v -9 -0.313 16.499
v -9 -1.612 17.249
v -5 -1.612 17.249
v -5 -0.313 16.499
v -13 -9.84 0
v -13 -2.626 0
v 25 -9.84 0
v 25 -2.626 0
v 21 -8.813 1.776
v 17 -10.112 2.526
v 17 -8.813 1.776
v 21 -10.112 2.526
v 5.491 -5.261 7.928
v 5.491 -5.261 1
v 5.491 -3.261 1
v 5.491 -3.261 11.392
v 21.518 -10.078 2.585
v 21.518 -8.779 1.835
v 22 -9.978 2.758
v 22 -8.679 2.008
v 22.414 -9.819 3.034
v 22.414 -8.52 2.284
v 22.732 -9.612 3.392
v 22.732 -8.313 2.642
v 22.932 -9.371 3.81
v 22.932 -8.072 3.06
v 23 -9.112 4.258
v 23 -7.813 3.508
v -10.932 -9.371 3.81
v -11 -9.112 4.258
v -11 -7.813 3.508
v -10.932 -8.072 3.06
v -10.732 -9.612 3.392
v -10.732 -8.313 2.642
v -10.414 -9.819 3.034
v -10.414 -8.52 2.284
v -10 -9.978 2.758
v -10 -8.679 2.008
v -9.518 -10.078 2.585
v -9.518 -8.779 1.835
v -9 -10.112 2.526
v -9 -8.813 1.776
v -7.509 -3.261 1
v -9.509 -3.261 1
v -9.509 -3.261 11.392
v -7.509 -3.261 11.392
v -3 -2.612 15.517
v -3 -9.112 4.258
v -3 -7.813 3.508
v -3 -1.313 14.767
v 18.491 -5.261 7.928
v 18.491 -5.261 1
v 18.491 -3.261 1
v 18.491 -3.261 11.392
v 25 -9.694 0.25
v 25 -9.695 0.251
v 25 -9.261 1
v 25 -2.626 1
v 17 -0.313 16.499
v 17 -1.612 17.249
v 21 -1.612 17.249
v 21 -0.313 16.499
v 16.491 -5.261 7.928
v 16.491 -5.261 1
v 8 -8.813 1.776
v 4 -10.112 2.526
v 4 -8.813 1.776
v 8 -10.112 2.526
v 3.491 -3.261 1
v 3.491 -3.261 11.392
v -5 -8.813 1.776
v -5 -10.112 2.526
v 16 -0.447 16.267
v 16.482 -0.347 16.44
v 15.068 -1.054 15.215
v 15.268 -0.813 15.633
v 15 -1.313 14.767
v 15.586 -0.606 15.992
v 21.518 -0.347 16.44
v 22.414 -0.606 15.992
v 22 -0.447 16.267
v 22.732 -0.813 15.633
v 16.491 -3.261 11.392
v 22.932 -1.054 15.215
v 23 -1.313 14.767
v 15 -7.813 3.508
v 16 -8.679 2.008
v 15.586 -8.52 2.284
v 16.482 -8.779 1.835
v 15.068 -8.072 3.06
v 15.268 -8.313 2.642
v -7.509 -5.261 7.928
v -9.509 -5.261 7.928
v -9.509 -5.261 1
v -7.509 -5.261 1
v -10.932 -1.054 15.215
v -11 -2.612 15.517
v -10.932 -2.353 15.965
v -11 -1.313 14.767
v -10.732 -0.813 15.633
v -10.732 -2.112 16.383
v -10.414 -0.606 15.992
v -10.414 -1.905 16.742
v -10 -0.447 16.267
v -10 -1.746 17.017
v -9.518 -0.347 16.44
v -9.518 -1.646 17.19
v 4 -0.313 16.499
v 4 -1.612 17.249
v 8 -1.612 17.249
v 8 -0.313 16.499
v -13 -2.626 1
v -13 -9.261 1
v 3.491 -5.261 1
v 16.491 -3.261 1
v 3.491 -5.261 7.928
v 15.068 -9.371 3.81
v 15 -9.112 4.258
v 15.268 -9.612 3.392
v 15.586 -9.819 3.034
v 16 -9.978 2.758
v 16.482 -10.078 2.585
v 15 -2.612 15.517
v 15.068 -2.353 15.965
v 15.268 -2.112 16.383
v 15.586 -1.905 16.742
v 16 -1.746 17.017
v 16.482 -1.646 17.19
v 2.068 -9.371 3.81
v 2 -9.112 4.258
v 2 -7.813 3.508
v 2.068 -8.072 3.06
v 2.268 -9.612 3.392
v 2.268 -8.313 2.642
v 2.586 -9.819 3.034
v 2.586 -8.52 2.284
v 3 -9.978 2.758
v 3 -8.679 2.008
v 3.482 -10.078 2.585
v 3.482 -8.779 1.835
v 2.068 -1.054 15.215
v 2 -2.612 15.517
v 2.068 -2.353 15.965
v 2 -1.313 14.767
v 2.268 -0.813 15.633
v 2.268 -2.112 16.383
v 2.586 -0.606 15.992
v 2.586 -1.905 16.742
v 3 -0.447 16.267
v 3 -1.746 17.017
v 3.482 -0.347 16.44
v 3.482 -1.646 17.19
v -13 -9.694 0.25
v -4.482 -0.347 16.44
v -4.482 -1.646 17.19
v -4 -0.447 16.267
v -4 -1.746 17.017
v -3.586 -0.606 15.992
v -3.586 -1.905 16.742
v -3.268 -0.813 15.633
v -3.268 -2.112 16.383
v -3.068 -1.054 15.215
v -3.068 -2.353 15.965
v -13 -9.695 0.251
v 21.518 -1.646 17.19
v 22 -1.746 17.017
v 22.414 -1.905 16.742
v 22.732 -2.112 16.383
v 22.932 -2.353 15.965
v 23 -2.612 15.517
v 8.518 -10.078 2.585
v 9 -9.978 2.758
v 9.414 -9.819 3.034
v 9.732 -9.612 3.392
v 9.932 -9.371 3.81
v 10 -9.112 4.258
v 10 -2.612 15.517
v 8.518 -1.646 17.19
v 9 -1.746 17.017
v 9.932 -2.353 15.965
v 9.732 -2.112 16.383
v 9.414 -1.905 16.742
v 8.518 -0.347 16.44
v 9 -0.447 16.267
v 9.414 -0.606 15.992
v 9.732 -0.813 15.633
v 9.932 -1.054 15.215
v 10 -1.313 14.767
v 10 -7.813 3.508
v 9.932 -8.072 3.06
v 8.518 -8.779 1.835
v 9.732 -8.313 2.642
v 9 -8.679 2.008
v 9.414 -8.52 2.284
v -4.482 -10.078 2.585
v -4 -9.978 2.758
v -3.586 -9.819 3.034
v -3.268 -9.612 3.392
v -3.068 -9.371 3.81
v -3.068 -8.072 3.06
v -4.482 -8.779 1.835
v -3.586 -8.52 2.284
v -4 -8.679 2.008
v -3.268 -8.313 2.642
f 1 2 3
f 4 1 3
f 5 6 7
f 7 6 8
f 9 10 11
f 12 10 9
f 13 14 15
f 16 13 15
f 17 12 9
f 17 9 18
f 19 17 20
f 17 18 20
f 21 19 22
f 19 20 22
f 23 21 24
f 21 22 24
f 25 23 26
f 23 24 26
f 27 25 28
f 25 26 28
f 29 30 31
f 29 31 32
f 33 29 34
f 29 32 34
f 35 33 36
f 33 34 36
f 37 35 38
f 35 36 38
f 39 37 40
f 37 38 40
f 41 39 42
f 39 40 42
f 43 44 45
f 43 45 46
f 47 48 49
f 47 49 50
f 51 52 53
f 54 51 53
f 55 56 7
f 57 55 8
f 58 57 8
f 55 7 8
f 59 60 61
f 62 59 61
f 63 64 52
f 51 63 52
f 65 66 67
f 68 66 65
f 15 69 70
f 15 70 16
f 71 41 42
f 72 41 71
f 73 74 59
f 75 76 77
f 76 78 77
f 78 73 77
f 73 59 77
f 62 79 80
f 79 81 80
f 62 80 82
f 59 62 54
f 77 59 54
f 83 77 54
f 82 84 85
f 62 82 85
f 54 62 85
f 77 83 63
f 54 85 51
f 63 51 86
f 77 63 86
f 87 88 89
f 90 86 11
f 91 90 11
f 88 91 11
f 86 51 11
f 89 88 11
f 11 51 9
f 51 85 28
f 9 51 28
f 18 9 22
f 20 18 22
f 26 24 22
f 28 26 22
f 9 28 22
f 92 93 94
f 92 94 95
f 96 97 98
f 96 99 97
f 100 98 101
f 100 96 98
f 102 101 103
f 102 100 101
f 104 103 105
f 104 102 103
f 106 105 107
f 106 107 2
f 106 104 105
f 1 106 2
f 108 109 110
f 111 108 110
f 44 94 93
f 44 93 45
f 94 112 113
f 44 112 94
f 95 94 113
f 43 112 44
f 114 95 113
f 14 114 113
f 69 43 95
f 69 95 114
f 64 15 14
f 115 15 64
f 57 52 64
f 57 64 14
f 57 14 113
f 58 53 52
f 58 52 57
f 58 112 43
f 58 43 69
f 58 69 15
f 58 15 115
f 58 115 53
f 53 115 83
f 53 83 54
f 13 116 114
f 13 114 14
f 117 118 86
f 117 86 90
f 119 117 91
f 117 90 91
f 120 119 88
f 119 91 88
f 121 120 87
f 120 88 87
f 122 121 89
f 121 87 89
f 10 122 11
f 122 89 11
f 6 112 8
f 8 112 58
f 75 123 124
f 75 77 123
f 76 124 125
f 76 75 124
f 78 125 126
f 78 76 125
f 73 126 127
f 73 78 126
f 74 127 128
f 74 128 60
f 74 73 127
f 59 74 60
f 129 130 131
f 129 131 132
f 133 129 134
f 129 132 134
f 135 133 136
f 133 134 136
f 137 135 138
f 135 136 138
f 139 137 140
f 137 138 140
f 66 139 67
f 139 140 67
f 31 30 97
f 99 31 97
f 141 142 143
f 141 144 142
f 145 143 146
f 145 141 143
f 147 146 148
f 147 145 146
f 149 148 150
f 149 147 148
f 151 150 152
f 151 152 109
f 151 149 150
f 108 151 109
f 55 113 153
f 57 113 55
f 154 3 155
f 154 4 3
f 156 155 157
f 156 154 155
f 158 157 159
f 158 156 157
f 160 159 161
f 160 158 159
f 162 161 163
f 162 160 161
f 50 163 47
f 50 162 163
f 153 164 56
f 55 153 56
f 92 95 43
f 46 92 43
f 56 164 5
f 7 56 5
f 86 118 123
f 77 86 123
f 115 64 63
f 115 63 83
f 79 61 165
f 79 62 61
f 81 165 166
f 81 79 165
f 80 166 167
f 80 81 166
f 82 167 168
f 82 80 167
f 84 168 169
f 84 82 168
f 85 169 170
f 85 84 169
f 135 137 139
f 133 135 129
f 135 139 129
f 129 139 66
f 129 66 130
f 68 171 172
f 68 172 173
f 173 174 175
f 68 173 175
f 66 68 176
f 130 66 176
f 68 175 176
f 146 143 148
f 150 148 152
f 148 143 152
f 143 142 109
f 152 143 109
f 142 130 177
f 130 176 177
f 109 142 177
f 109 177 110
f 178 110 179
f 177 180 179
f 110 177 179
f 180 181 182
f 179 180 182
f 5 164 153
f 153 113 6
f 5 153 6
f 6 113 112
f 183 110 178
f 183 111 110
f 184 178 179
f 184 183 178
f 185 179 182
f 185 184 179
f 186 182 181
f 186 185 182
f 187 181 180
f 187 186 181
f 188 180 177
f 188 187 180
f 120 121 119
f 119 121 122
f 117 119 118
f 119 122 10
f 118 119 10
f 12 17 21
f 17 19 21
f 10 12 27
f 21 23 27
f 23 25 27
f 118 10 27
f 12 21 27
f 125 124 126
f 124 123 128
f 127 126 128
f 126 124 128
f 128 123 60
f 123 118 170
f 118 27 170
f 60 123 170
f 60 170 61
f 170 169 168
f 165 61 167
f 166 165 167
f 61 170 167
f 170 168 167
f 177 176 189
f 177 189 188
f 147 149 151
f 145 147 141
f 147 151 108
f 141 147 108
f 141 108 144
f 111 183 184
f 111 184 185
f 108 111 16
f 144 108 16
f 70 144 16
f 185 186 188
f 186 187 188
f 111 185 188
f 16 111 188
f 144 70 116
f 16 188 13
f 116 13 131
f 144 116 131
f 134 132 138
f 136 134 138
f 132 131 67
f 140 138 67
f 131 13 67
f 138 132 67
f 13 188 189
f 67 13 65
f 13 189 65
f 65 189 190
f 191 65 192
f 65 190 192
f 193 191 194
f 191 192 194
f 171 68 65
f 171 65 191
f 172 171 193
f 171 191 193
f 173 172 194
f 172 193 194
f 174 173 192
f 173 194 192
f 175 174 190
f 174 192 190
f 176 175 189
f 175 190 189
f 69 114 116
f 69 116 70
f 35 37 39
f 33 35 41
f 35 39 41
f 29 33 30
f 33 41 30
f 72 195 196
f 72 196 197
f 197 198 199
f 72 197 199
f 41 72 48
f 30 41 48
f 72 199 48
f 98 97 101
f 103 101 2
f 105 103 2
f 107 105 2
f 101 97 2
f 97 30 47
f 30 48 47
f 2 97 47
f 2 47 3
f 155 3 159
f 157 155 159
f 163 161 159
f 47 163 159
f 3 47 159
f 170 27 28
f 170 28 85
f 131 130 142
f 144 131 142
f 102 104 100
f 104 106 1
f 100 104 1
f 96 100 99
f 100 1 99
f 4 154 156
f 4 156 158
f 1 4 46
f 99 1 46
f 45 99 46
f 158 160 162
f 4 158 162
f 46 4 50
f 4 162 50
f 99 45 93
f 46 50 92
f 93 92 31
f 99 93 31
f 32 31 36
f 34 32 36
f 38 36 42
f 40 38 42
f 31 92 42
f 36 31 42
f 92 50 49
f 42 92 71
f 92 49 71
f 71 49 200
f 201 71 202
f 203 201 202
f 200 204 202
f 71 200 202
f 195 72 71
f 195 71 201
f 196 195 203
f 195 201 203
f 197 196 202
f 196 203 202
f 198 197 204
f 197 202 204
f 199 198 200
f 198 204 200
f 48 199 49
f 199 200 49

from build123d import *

# Parameters (mm, degrees)
SKETCH1_W           = 50
SKETCH1_H           = 30
BOSS_EXTRUDE1_DEPTH = 1
BOSS_EXTRUDE2_DEPTH = 50
SKETCH3_W           = 50
SKETCH3_H           = 20.262529014
SKETCH3_W_2         = 8
SKETCH3_H_2         = 17
CUT_EXTRUDE1_DEPTH  = 1.5
BOSS_EXTRUDE3_REACH = 18.249
SKETCH4_W           = 2
SKETCH4_H           = 2
CUT_EXTRUDE2_DEPTH  = 50
SKETCH6_W           = 12
SKETCH6_H           = 25.737309448
CUT_EXTRUDE3_DEPTH  = 1
SKETCH7_W           = 38
SKETCH7_H           = 17.625558307
CUT_EXTRUDE4_DEPTH  = 1
FILLET1_R           = 2
FILLET2_R           = 2


with BuildPart() as part:
    # Sketch1 → Boss-Extrude1 (new body)
    with BuildSketch(Plane.XY):
        Rectangle(SKETCH1_W, SKETCH1_H)
    extrude(amount=BOSS_EXTRUDE1_DEPTH)

    # Sketch2 → Boss-Extrude2 (add, through all)
    with BuildSketch(Plane(origin=(25, 0, 0), x_dir=(0, 0, -1), z_dir=(1, 0, 0))):
        Polygon((-1, -10.993105909), (-18.547864871, -0.861841403), (-17.797864871, 0.437196703), (-1, -9.261055102), align=None)
    extrude(amount=-BOSS_EXTRUDE2_DEPTH)

    # Sketch3 → Cut-Extrude1 (cut)
    with BuildSketch(Plane(origin=(0, -8.677842134, 5.010154492), x_dir=(1, 0, 0), z_dir=(0, -0.866025404, 0.5))):
        with Locations((0, 5.500736956)):
            Rectangle(SKETCH3_W, SKETCH3_H)
        with Locations((19, 5.632001463)):
            Rectangle(SKETCH3_W_2, SKETCH3_H_2, mode=Mode.SUBTRACT)
        with Locations((6, 5.632001463)):
            Rectangle(SKETCH3_W_2, SKETCH3_H_2, mode=Mode.SUBTRACT)
        with Locations((-7, 5.632001463)):
            Rectangle(SKETCH3_W_2, SKETCH3_H_2, mode=Mode.SUBTRACT)
    extrude(amount=-CUT_EXTRUDE1_DEPTH, mode=Mode.SUBTRACT)

    # Boss-Extrude3: up to this face of the body (flat: up to its plane)
    boss_extrude3_end = Plane(part.part.faces().sort_by_distance((19, -5.861841403, 9.887610833))[0])
    # Sketch4 → Boss-Extrude3 (add, up to the picked face)
    with BuildSketch(Plane.XY.offset(1), mode=Mode.PRIVATE) as boss_extrude3_sk1:
        with Locations((17.490902079, -4.261055102)):
            Rectangle(SKETCH4_W, SKETCH4_H)
    boss_extrude3_tool1 = split(extrude(boss_extrude3_sk1.sketch, amount=BOSS_EXTRUDE3_REACH, mode=Mode.PRIVATE), bisect_by=boss_extrude3_end, keep=Keep.BOTH, mode=Mode.PRIVATE)
    add(boss_extrude3_tool1.solids().sort_by_distance((17.490902, -4.261055, 1))[0])
    # Sketch4 → Boss-Extrude3 (add, up to the picked face)
    with BuildSketch(Plane.XY.offset(1), mode=Mode.PRIVATE) as boss_extrude3_sk2:
        with Locations((4.490902079, -4.261055102)):
            Rectangle(SKETCH4_W, SKETCH4_H)
    boss_extrude3_tool2 = split(extrude(boss_extrude3_sk2.sketch, amount=BOSS_EXTRUDE3_REACH, mode=Mode.PRIVATE), bisect_by=boss_extrude3_end, keep=Keep.BOTH, mode=Mode.PRIVATE)
    add(boss_extrude3_tool2.solids().sort_by_distance((4.490902, -4.261055, 1))[0])
    # Sketch4 → Boss-Extrude3 (add, up to the picked face)
    with BuildSketch(Plane.XY.offset(1), mode=Mode.PRIVATE) as boss_extrude3_sk3:
        with Locations((-8.509097921, -4.261055102)):
            Rectangle(SKETCH4_W, SKETCH4_H)
    boss_extrude3_tool3 = split(extrude(boss_extrude3_sk3.sketch, amount=BOSS_EXTRUDE3_REACH, mode=Mode.PRIVATE), bisect_by=boss_extrude3_end, keep=Keep.BOTH, mode=Mode.PRIVATE)
    add(boss_extrude3_tool3.solids().sort_by_distance((-8.509098, -4.261055, 1))[0])

    # Sketch5 → Cut-Extrude2 (cut)
    with BuildSketch(Plane.ZY.offset(25)):
        Polygon((0.250581886, -9.69507566), (0, -9.840198507), (0, -15), (1, -15), (1, -10.993105909), align=None)
    extrude(amount=-CUT_EXTRUDE2_DEPTH, mode=Mode.SUBTRACT)

    # Sketch6 → Cut-Extrude3 (cut)
    with BuildSketch(Plane.XY.offset(1)):
        with Locations((-19, 2.131345276)):
            Rectangle(SKETCH6_W, SKETCH6_H)
    extrude(amount=-CUT_EXTRUDE3_DEPTH, mode=Mode.SUBTRACT)

    # Sketch7 → Cut-Extrude4 (cut)
    with BuildSketch(Plane.XY.offset(1)):
        with Locations((6, 6.187220847)):
            Rectangle(SKETCH7_W, SKETCH7_H)
    extrude(amount=-CUT_EXTRUDE4_DEPTH, mode=Mode.SUBTRACT)

    # Fillet1
    fillet1_edges = [part.edges().sort_by_distance(p)[0] for p in [
        (-3, -9.46232235, 2.151394901),
        (-3, -0.96232235, 16.873826765),
        (-11, -0.96232235, 16.873826765),
        (-11, -9.46232235, 2.151394901),
    ]]
    fillet(fillet1_edges, radius=FILLET1_R)

    # Fillet2
    fillet2_edges = [part.edges().sort_by_distance(p)[0] for p in [
        (23, -9.46232235, 2.151394901),
        (23, -0.96232235, 16.873826765),
        (15, -0.96232235, 16.873826765),
        (15, -9.46232235, 2.151394901),
        (10, -9.46232235, 2.151394901),
        (10, -0.96232235, 16.873826765),
        (2, -0.96232235, 16.873826765),
        (2, -9.46232235, 2.151394901),
    ]]
    fillet(fillet2_edges, radius=FILLET2_R)


solid = part.part
